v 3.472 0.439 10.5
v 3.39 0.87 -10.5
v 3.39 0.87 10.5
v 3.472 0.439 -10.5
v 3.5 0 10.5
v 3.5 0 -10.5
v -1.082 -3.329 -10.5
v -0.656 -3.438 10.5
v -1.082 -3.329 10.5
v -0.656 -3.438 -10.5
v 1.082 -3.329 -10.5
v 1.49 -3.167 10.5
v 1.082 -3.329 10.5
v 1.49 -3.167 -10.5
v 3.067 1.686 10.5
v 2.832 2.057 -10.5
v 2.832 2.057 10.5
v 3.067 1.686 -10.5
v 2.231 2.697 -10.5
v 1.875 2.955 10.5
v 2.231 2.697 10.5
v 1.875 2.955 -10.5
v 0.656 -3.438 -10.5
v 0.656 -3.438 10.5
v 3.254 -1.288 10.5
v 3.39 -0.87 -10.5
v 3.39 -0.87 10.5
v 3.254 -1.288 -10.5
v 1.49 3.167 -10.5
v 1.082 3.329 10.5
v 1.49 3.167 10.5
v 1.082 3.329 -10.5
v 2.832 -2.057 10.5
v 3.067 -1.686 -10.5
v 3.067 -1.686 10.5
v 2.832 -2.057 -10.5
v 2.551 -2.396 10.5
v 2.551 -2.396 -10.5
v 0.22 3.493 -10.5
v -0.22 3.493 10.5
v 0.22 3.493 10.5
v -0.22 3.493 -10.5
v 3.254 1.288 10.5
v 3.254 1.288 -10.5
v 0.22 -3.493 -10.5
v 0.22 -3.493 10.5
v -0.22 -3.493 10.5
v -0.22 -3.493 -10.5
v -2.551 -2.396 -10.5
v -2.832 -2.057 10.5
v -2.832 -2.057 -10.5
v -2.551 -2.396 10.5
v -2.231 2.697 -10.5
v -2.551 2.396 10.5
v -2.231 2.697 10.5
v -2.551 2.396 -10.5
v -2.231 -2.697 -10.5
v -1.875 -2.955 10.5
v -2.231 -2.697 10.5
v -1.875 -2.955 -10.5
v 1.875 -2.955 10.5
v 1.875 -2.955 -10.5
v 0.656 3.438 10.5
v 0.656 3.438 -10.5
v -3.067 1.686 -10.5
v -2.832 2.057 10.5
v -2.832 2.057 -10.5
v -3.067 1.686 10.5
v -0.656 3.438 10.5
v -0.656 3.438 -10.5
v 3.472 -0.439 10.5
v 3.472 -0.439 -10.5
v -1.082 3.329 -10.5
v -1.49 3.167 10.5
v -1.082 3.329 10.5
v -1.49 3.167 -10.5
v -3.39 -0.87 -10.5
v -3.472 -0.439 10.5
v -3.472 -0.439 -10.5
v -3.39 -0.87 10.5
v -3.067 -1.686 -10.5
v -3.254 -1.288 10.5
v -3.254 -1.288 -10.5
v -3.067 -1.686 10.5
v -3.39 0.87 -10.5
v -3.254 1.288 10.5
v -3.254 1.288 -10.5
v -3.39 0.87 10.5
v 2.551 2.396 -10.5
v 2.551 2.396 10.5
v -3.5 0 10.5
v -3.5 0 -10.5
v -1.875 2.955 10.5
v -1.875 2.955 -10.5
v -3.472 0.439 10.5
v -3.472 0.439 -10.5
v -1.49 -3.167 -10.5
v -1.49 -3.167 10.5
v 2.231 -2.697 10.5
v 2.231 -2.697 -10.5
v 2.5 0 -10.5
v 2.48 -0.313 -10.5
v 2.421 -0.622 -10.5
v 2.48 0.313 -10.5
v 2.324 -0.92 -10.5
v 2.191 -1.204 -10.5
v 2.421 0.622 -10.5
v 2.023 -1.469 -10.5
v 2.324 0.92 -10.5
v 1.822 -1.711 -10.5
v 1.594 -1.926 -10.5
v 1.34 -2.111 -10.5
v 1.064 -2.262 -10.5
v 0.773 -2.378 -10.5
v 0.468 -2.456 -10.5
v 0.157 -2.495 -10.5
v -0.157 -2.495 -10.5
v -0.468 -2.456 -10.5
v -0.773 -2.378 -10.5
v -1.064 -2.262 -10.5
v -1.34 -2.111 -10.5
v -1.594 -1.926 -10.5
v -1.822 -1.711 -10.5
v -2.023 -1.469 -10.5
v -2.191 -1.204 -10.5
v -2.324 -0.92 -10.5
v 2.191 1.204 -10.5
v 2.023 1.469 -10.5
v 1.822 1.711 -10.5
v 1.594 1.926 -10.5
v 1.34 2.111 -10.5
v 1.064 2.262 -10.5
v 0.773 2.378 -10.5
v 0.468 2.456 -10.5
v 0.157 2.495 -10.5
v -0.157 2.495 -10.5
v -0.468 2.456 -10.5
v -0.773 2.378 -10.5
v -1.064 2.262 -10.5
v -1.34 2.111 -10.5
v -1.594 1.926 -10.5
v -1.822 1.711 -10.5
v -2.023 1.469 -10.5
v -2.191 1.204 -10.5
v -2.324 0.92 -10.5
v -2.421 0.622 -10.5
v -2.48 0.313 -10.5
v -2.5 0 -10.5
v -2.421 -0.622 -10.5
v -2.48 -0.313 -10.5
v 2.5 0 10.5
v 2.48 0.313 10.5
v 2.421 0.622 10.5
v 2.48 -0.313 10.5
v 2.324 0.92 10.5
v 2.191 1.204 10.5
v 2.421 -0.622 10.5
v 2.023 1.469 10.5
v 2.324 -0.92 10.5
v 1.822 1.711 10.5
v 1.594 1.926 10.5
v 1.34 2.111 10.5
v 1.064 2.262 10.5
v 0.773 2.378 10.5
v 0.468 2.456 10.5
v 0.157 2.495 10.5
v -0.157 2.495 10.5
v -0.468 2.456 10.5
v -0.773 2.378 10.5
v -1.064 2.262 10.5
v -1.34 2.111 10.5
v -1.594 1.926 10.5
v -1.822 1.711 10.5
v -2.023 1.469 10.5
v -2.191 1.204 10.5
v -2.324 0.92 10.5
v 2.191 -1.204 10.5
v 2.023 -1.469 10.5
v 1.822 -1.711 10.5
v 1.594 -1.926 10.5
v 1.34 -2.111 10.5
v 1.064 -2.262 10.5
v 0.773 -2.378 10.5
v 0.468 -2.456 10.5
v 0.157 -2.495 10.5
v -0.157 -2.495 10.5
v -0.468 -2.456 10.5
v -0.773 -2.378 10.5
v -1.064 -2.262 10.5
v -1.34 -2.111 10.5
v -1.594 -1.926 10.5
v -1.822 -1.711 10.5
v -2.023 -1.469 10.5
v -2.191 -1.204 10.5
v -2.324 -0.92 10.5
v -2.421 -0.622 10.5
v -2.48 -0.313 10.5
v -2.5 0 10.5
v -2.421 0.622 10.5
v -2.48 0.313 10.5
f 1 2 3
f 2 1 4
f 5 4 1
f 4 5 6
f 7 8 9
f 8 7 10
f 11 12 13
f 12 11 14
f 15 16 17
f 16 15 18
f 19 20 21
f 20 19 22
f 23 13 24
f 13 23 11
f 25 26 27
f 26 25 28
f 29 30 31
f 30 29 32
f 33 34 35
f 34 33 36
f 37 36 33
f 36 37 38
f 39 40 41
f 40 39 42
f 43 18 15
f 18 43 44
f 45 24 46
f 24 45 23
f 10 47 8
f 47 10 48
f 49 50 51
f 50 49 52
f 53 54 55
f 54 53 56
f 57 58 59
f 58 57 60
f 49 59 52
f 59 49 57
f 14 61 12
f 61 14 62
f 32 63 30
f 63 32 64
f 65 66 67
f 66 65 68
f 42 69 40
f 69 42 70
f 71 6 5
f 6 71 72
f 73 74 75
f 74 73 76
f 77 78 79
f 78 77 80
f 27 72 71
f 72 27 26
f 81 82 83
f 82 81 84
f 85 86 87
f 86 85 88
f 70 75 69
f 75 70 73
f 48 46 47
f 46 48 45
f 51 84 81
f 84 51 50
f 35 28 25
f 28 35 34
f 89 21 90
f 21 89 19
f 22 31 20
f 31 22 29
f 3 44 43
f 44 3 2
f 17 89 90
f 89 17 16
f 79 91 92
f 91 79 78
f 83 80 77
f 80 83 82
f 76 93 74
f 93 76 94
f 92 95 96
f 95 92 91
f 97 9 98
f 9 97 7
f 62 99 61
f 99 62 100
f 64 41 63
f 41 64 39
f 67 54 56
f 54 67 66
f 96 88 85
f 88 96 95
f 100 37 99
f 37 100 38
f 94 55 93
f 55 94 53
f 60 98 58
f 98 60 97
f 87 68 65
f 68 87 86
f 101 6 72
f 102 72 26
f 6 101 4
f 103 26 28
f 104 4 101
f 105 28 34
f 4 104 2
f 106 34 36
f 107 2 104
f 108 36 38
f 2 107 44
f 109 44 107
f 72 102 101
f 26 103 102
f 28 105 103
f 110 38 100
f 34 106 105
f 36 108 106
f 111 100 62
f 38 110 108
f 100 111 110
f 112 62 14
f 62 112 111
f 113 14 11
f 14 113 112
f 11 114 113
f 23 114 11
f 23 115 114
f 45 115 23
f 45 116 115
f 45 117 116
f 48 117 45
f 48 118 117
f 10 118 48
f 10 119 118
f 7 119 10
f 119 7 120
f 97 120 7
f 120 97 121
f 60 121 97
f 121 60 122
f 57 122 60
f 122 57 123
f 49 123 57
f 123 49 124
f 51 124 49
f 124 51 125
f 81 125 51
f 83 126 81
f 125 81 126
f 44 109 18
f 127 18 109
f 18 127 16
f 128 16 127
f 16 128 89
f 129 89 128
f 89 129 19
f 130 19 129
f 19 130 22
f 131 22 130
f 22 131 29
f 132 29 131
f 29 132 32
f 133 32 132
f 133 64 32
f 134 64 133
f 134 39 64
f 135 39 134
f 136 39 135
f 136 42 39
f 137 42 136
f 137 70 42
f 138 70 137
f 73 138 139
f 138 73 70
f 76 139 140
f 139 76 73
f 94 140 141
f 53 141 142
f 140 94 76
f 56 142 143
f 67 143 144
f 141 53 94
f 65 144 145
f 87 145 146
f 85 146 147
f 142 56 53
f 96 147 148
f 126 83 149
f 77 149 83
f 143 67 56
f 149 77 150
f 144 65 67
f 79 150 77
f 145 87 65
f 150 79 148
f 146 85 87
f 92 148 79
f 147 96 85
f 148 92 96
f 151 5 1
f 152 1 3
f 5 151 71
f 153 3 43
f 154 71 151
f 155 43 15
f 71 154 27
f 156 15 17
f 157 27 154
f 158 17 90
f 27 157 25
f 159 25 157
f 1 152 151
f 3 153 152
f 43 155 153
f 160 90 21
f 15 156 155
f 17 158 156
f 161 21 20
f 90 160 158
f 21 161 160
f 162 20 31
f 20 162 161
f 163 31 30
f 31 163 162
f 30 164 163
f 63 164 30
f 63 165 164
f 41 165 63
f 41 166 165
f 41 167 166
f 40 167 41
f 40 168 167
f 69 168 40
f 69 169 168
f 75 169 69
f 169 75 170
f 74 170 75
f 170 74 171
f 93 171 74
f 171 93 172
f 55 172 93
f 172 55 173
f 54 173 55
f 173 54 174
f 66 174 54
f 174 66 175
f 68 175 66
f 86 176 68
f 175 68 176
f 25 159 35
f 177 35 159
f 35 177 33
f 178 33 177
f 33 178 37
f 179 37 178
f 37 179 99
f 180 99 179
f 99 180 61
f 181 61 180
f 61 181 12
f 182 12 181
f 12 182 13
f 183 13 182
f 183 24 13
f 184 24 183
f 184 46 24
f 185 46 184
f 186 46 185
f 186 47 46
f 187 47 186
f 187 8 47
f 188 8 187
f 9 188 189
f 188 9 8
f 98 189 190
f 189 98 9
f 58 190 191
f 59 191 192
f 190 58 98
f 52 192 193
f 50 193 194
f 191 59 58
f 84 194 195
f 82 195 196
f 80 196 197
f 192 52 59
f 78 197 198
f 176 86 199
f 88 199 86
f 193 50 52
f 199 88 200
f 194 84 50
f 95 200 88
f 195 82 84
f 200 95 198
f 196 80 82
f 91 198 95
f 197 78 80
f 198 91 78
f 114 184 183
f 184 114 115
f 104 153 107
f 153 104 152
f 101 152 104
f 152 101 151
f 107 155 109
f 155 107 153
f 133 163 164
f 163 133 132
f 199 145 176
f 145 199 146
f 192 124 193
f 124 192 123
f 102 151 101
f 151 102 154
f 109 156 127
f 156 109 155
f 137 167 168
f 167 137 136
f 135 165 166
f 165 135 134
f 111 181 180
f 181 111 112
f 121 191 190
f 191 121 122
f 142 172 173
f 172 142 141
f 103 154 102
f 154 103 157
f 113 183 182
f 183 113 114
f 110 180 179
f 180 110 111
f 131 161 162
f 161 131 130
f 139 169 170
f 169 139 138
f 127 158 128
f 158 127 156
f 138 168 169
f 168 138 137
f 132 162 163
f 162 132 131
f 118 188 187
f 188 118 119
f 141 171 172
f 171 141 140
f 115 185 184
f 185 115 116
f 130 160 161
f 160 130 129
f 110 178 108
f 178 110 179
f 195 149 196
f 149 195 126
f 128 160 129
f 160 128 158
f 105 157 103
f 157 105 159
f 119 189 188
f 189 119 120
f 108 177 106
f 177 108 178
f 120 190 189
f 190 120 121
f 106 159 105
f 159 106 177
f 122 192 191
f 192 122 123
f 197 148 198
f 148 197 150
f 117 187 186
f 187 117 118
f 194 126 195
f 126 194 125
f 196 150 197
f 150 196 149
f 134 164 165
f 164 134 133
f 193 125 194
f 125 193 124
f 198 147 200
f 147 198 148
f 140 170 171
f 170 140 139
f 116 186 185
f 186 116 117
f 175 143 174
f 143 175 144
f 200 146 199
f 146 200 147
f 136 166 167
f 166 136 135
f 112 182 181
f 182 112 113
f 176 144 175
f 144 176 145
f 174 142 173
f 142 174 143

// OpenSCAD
$fn = 50;


difference() {
	union() {
		translate(v = [0, 0, -10.5000000000]) {
			cylinder(h = 21, r = 3.5000000000);
		}
	}
	union() {
		translate(v = [0, 0, -100.0000000000]) {
			cylinder(h = 200, r = 2.5000000000);
		}
	}
}
